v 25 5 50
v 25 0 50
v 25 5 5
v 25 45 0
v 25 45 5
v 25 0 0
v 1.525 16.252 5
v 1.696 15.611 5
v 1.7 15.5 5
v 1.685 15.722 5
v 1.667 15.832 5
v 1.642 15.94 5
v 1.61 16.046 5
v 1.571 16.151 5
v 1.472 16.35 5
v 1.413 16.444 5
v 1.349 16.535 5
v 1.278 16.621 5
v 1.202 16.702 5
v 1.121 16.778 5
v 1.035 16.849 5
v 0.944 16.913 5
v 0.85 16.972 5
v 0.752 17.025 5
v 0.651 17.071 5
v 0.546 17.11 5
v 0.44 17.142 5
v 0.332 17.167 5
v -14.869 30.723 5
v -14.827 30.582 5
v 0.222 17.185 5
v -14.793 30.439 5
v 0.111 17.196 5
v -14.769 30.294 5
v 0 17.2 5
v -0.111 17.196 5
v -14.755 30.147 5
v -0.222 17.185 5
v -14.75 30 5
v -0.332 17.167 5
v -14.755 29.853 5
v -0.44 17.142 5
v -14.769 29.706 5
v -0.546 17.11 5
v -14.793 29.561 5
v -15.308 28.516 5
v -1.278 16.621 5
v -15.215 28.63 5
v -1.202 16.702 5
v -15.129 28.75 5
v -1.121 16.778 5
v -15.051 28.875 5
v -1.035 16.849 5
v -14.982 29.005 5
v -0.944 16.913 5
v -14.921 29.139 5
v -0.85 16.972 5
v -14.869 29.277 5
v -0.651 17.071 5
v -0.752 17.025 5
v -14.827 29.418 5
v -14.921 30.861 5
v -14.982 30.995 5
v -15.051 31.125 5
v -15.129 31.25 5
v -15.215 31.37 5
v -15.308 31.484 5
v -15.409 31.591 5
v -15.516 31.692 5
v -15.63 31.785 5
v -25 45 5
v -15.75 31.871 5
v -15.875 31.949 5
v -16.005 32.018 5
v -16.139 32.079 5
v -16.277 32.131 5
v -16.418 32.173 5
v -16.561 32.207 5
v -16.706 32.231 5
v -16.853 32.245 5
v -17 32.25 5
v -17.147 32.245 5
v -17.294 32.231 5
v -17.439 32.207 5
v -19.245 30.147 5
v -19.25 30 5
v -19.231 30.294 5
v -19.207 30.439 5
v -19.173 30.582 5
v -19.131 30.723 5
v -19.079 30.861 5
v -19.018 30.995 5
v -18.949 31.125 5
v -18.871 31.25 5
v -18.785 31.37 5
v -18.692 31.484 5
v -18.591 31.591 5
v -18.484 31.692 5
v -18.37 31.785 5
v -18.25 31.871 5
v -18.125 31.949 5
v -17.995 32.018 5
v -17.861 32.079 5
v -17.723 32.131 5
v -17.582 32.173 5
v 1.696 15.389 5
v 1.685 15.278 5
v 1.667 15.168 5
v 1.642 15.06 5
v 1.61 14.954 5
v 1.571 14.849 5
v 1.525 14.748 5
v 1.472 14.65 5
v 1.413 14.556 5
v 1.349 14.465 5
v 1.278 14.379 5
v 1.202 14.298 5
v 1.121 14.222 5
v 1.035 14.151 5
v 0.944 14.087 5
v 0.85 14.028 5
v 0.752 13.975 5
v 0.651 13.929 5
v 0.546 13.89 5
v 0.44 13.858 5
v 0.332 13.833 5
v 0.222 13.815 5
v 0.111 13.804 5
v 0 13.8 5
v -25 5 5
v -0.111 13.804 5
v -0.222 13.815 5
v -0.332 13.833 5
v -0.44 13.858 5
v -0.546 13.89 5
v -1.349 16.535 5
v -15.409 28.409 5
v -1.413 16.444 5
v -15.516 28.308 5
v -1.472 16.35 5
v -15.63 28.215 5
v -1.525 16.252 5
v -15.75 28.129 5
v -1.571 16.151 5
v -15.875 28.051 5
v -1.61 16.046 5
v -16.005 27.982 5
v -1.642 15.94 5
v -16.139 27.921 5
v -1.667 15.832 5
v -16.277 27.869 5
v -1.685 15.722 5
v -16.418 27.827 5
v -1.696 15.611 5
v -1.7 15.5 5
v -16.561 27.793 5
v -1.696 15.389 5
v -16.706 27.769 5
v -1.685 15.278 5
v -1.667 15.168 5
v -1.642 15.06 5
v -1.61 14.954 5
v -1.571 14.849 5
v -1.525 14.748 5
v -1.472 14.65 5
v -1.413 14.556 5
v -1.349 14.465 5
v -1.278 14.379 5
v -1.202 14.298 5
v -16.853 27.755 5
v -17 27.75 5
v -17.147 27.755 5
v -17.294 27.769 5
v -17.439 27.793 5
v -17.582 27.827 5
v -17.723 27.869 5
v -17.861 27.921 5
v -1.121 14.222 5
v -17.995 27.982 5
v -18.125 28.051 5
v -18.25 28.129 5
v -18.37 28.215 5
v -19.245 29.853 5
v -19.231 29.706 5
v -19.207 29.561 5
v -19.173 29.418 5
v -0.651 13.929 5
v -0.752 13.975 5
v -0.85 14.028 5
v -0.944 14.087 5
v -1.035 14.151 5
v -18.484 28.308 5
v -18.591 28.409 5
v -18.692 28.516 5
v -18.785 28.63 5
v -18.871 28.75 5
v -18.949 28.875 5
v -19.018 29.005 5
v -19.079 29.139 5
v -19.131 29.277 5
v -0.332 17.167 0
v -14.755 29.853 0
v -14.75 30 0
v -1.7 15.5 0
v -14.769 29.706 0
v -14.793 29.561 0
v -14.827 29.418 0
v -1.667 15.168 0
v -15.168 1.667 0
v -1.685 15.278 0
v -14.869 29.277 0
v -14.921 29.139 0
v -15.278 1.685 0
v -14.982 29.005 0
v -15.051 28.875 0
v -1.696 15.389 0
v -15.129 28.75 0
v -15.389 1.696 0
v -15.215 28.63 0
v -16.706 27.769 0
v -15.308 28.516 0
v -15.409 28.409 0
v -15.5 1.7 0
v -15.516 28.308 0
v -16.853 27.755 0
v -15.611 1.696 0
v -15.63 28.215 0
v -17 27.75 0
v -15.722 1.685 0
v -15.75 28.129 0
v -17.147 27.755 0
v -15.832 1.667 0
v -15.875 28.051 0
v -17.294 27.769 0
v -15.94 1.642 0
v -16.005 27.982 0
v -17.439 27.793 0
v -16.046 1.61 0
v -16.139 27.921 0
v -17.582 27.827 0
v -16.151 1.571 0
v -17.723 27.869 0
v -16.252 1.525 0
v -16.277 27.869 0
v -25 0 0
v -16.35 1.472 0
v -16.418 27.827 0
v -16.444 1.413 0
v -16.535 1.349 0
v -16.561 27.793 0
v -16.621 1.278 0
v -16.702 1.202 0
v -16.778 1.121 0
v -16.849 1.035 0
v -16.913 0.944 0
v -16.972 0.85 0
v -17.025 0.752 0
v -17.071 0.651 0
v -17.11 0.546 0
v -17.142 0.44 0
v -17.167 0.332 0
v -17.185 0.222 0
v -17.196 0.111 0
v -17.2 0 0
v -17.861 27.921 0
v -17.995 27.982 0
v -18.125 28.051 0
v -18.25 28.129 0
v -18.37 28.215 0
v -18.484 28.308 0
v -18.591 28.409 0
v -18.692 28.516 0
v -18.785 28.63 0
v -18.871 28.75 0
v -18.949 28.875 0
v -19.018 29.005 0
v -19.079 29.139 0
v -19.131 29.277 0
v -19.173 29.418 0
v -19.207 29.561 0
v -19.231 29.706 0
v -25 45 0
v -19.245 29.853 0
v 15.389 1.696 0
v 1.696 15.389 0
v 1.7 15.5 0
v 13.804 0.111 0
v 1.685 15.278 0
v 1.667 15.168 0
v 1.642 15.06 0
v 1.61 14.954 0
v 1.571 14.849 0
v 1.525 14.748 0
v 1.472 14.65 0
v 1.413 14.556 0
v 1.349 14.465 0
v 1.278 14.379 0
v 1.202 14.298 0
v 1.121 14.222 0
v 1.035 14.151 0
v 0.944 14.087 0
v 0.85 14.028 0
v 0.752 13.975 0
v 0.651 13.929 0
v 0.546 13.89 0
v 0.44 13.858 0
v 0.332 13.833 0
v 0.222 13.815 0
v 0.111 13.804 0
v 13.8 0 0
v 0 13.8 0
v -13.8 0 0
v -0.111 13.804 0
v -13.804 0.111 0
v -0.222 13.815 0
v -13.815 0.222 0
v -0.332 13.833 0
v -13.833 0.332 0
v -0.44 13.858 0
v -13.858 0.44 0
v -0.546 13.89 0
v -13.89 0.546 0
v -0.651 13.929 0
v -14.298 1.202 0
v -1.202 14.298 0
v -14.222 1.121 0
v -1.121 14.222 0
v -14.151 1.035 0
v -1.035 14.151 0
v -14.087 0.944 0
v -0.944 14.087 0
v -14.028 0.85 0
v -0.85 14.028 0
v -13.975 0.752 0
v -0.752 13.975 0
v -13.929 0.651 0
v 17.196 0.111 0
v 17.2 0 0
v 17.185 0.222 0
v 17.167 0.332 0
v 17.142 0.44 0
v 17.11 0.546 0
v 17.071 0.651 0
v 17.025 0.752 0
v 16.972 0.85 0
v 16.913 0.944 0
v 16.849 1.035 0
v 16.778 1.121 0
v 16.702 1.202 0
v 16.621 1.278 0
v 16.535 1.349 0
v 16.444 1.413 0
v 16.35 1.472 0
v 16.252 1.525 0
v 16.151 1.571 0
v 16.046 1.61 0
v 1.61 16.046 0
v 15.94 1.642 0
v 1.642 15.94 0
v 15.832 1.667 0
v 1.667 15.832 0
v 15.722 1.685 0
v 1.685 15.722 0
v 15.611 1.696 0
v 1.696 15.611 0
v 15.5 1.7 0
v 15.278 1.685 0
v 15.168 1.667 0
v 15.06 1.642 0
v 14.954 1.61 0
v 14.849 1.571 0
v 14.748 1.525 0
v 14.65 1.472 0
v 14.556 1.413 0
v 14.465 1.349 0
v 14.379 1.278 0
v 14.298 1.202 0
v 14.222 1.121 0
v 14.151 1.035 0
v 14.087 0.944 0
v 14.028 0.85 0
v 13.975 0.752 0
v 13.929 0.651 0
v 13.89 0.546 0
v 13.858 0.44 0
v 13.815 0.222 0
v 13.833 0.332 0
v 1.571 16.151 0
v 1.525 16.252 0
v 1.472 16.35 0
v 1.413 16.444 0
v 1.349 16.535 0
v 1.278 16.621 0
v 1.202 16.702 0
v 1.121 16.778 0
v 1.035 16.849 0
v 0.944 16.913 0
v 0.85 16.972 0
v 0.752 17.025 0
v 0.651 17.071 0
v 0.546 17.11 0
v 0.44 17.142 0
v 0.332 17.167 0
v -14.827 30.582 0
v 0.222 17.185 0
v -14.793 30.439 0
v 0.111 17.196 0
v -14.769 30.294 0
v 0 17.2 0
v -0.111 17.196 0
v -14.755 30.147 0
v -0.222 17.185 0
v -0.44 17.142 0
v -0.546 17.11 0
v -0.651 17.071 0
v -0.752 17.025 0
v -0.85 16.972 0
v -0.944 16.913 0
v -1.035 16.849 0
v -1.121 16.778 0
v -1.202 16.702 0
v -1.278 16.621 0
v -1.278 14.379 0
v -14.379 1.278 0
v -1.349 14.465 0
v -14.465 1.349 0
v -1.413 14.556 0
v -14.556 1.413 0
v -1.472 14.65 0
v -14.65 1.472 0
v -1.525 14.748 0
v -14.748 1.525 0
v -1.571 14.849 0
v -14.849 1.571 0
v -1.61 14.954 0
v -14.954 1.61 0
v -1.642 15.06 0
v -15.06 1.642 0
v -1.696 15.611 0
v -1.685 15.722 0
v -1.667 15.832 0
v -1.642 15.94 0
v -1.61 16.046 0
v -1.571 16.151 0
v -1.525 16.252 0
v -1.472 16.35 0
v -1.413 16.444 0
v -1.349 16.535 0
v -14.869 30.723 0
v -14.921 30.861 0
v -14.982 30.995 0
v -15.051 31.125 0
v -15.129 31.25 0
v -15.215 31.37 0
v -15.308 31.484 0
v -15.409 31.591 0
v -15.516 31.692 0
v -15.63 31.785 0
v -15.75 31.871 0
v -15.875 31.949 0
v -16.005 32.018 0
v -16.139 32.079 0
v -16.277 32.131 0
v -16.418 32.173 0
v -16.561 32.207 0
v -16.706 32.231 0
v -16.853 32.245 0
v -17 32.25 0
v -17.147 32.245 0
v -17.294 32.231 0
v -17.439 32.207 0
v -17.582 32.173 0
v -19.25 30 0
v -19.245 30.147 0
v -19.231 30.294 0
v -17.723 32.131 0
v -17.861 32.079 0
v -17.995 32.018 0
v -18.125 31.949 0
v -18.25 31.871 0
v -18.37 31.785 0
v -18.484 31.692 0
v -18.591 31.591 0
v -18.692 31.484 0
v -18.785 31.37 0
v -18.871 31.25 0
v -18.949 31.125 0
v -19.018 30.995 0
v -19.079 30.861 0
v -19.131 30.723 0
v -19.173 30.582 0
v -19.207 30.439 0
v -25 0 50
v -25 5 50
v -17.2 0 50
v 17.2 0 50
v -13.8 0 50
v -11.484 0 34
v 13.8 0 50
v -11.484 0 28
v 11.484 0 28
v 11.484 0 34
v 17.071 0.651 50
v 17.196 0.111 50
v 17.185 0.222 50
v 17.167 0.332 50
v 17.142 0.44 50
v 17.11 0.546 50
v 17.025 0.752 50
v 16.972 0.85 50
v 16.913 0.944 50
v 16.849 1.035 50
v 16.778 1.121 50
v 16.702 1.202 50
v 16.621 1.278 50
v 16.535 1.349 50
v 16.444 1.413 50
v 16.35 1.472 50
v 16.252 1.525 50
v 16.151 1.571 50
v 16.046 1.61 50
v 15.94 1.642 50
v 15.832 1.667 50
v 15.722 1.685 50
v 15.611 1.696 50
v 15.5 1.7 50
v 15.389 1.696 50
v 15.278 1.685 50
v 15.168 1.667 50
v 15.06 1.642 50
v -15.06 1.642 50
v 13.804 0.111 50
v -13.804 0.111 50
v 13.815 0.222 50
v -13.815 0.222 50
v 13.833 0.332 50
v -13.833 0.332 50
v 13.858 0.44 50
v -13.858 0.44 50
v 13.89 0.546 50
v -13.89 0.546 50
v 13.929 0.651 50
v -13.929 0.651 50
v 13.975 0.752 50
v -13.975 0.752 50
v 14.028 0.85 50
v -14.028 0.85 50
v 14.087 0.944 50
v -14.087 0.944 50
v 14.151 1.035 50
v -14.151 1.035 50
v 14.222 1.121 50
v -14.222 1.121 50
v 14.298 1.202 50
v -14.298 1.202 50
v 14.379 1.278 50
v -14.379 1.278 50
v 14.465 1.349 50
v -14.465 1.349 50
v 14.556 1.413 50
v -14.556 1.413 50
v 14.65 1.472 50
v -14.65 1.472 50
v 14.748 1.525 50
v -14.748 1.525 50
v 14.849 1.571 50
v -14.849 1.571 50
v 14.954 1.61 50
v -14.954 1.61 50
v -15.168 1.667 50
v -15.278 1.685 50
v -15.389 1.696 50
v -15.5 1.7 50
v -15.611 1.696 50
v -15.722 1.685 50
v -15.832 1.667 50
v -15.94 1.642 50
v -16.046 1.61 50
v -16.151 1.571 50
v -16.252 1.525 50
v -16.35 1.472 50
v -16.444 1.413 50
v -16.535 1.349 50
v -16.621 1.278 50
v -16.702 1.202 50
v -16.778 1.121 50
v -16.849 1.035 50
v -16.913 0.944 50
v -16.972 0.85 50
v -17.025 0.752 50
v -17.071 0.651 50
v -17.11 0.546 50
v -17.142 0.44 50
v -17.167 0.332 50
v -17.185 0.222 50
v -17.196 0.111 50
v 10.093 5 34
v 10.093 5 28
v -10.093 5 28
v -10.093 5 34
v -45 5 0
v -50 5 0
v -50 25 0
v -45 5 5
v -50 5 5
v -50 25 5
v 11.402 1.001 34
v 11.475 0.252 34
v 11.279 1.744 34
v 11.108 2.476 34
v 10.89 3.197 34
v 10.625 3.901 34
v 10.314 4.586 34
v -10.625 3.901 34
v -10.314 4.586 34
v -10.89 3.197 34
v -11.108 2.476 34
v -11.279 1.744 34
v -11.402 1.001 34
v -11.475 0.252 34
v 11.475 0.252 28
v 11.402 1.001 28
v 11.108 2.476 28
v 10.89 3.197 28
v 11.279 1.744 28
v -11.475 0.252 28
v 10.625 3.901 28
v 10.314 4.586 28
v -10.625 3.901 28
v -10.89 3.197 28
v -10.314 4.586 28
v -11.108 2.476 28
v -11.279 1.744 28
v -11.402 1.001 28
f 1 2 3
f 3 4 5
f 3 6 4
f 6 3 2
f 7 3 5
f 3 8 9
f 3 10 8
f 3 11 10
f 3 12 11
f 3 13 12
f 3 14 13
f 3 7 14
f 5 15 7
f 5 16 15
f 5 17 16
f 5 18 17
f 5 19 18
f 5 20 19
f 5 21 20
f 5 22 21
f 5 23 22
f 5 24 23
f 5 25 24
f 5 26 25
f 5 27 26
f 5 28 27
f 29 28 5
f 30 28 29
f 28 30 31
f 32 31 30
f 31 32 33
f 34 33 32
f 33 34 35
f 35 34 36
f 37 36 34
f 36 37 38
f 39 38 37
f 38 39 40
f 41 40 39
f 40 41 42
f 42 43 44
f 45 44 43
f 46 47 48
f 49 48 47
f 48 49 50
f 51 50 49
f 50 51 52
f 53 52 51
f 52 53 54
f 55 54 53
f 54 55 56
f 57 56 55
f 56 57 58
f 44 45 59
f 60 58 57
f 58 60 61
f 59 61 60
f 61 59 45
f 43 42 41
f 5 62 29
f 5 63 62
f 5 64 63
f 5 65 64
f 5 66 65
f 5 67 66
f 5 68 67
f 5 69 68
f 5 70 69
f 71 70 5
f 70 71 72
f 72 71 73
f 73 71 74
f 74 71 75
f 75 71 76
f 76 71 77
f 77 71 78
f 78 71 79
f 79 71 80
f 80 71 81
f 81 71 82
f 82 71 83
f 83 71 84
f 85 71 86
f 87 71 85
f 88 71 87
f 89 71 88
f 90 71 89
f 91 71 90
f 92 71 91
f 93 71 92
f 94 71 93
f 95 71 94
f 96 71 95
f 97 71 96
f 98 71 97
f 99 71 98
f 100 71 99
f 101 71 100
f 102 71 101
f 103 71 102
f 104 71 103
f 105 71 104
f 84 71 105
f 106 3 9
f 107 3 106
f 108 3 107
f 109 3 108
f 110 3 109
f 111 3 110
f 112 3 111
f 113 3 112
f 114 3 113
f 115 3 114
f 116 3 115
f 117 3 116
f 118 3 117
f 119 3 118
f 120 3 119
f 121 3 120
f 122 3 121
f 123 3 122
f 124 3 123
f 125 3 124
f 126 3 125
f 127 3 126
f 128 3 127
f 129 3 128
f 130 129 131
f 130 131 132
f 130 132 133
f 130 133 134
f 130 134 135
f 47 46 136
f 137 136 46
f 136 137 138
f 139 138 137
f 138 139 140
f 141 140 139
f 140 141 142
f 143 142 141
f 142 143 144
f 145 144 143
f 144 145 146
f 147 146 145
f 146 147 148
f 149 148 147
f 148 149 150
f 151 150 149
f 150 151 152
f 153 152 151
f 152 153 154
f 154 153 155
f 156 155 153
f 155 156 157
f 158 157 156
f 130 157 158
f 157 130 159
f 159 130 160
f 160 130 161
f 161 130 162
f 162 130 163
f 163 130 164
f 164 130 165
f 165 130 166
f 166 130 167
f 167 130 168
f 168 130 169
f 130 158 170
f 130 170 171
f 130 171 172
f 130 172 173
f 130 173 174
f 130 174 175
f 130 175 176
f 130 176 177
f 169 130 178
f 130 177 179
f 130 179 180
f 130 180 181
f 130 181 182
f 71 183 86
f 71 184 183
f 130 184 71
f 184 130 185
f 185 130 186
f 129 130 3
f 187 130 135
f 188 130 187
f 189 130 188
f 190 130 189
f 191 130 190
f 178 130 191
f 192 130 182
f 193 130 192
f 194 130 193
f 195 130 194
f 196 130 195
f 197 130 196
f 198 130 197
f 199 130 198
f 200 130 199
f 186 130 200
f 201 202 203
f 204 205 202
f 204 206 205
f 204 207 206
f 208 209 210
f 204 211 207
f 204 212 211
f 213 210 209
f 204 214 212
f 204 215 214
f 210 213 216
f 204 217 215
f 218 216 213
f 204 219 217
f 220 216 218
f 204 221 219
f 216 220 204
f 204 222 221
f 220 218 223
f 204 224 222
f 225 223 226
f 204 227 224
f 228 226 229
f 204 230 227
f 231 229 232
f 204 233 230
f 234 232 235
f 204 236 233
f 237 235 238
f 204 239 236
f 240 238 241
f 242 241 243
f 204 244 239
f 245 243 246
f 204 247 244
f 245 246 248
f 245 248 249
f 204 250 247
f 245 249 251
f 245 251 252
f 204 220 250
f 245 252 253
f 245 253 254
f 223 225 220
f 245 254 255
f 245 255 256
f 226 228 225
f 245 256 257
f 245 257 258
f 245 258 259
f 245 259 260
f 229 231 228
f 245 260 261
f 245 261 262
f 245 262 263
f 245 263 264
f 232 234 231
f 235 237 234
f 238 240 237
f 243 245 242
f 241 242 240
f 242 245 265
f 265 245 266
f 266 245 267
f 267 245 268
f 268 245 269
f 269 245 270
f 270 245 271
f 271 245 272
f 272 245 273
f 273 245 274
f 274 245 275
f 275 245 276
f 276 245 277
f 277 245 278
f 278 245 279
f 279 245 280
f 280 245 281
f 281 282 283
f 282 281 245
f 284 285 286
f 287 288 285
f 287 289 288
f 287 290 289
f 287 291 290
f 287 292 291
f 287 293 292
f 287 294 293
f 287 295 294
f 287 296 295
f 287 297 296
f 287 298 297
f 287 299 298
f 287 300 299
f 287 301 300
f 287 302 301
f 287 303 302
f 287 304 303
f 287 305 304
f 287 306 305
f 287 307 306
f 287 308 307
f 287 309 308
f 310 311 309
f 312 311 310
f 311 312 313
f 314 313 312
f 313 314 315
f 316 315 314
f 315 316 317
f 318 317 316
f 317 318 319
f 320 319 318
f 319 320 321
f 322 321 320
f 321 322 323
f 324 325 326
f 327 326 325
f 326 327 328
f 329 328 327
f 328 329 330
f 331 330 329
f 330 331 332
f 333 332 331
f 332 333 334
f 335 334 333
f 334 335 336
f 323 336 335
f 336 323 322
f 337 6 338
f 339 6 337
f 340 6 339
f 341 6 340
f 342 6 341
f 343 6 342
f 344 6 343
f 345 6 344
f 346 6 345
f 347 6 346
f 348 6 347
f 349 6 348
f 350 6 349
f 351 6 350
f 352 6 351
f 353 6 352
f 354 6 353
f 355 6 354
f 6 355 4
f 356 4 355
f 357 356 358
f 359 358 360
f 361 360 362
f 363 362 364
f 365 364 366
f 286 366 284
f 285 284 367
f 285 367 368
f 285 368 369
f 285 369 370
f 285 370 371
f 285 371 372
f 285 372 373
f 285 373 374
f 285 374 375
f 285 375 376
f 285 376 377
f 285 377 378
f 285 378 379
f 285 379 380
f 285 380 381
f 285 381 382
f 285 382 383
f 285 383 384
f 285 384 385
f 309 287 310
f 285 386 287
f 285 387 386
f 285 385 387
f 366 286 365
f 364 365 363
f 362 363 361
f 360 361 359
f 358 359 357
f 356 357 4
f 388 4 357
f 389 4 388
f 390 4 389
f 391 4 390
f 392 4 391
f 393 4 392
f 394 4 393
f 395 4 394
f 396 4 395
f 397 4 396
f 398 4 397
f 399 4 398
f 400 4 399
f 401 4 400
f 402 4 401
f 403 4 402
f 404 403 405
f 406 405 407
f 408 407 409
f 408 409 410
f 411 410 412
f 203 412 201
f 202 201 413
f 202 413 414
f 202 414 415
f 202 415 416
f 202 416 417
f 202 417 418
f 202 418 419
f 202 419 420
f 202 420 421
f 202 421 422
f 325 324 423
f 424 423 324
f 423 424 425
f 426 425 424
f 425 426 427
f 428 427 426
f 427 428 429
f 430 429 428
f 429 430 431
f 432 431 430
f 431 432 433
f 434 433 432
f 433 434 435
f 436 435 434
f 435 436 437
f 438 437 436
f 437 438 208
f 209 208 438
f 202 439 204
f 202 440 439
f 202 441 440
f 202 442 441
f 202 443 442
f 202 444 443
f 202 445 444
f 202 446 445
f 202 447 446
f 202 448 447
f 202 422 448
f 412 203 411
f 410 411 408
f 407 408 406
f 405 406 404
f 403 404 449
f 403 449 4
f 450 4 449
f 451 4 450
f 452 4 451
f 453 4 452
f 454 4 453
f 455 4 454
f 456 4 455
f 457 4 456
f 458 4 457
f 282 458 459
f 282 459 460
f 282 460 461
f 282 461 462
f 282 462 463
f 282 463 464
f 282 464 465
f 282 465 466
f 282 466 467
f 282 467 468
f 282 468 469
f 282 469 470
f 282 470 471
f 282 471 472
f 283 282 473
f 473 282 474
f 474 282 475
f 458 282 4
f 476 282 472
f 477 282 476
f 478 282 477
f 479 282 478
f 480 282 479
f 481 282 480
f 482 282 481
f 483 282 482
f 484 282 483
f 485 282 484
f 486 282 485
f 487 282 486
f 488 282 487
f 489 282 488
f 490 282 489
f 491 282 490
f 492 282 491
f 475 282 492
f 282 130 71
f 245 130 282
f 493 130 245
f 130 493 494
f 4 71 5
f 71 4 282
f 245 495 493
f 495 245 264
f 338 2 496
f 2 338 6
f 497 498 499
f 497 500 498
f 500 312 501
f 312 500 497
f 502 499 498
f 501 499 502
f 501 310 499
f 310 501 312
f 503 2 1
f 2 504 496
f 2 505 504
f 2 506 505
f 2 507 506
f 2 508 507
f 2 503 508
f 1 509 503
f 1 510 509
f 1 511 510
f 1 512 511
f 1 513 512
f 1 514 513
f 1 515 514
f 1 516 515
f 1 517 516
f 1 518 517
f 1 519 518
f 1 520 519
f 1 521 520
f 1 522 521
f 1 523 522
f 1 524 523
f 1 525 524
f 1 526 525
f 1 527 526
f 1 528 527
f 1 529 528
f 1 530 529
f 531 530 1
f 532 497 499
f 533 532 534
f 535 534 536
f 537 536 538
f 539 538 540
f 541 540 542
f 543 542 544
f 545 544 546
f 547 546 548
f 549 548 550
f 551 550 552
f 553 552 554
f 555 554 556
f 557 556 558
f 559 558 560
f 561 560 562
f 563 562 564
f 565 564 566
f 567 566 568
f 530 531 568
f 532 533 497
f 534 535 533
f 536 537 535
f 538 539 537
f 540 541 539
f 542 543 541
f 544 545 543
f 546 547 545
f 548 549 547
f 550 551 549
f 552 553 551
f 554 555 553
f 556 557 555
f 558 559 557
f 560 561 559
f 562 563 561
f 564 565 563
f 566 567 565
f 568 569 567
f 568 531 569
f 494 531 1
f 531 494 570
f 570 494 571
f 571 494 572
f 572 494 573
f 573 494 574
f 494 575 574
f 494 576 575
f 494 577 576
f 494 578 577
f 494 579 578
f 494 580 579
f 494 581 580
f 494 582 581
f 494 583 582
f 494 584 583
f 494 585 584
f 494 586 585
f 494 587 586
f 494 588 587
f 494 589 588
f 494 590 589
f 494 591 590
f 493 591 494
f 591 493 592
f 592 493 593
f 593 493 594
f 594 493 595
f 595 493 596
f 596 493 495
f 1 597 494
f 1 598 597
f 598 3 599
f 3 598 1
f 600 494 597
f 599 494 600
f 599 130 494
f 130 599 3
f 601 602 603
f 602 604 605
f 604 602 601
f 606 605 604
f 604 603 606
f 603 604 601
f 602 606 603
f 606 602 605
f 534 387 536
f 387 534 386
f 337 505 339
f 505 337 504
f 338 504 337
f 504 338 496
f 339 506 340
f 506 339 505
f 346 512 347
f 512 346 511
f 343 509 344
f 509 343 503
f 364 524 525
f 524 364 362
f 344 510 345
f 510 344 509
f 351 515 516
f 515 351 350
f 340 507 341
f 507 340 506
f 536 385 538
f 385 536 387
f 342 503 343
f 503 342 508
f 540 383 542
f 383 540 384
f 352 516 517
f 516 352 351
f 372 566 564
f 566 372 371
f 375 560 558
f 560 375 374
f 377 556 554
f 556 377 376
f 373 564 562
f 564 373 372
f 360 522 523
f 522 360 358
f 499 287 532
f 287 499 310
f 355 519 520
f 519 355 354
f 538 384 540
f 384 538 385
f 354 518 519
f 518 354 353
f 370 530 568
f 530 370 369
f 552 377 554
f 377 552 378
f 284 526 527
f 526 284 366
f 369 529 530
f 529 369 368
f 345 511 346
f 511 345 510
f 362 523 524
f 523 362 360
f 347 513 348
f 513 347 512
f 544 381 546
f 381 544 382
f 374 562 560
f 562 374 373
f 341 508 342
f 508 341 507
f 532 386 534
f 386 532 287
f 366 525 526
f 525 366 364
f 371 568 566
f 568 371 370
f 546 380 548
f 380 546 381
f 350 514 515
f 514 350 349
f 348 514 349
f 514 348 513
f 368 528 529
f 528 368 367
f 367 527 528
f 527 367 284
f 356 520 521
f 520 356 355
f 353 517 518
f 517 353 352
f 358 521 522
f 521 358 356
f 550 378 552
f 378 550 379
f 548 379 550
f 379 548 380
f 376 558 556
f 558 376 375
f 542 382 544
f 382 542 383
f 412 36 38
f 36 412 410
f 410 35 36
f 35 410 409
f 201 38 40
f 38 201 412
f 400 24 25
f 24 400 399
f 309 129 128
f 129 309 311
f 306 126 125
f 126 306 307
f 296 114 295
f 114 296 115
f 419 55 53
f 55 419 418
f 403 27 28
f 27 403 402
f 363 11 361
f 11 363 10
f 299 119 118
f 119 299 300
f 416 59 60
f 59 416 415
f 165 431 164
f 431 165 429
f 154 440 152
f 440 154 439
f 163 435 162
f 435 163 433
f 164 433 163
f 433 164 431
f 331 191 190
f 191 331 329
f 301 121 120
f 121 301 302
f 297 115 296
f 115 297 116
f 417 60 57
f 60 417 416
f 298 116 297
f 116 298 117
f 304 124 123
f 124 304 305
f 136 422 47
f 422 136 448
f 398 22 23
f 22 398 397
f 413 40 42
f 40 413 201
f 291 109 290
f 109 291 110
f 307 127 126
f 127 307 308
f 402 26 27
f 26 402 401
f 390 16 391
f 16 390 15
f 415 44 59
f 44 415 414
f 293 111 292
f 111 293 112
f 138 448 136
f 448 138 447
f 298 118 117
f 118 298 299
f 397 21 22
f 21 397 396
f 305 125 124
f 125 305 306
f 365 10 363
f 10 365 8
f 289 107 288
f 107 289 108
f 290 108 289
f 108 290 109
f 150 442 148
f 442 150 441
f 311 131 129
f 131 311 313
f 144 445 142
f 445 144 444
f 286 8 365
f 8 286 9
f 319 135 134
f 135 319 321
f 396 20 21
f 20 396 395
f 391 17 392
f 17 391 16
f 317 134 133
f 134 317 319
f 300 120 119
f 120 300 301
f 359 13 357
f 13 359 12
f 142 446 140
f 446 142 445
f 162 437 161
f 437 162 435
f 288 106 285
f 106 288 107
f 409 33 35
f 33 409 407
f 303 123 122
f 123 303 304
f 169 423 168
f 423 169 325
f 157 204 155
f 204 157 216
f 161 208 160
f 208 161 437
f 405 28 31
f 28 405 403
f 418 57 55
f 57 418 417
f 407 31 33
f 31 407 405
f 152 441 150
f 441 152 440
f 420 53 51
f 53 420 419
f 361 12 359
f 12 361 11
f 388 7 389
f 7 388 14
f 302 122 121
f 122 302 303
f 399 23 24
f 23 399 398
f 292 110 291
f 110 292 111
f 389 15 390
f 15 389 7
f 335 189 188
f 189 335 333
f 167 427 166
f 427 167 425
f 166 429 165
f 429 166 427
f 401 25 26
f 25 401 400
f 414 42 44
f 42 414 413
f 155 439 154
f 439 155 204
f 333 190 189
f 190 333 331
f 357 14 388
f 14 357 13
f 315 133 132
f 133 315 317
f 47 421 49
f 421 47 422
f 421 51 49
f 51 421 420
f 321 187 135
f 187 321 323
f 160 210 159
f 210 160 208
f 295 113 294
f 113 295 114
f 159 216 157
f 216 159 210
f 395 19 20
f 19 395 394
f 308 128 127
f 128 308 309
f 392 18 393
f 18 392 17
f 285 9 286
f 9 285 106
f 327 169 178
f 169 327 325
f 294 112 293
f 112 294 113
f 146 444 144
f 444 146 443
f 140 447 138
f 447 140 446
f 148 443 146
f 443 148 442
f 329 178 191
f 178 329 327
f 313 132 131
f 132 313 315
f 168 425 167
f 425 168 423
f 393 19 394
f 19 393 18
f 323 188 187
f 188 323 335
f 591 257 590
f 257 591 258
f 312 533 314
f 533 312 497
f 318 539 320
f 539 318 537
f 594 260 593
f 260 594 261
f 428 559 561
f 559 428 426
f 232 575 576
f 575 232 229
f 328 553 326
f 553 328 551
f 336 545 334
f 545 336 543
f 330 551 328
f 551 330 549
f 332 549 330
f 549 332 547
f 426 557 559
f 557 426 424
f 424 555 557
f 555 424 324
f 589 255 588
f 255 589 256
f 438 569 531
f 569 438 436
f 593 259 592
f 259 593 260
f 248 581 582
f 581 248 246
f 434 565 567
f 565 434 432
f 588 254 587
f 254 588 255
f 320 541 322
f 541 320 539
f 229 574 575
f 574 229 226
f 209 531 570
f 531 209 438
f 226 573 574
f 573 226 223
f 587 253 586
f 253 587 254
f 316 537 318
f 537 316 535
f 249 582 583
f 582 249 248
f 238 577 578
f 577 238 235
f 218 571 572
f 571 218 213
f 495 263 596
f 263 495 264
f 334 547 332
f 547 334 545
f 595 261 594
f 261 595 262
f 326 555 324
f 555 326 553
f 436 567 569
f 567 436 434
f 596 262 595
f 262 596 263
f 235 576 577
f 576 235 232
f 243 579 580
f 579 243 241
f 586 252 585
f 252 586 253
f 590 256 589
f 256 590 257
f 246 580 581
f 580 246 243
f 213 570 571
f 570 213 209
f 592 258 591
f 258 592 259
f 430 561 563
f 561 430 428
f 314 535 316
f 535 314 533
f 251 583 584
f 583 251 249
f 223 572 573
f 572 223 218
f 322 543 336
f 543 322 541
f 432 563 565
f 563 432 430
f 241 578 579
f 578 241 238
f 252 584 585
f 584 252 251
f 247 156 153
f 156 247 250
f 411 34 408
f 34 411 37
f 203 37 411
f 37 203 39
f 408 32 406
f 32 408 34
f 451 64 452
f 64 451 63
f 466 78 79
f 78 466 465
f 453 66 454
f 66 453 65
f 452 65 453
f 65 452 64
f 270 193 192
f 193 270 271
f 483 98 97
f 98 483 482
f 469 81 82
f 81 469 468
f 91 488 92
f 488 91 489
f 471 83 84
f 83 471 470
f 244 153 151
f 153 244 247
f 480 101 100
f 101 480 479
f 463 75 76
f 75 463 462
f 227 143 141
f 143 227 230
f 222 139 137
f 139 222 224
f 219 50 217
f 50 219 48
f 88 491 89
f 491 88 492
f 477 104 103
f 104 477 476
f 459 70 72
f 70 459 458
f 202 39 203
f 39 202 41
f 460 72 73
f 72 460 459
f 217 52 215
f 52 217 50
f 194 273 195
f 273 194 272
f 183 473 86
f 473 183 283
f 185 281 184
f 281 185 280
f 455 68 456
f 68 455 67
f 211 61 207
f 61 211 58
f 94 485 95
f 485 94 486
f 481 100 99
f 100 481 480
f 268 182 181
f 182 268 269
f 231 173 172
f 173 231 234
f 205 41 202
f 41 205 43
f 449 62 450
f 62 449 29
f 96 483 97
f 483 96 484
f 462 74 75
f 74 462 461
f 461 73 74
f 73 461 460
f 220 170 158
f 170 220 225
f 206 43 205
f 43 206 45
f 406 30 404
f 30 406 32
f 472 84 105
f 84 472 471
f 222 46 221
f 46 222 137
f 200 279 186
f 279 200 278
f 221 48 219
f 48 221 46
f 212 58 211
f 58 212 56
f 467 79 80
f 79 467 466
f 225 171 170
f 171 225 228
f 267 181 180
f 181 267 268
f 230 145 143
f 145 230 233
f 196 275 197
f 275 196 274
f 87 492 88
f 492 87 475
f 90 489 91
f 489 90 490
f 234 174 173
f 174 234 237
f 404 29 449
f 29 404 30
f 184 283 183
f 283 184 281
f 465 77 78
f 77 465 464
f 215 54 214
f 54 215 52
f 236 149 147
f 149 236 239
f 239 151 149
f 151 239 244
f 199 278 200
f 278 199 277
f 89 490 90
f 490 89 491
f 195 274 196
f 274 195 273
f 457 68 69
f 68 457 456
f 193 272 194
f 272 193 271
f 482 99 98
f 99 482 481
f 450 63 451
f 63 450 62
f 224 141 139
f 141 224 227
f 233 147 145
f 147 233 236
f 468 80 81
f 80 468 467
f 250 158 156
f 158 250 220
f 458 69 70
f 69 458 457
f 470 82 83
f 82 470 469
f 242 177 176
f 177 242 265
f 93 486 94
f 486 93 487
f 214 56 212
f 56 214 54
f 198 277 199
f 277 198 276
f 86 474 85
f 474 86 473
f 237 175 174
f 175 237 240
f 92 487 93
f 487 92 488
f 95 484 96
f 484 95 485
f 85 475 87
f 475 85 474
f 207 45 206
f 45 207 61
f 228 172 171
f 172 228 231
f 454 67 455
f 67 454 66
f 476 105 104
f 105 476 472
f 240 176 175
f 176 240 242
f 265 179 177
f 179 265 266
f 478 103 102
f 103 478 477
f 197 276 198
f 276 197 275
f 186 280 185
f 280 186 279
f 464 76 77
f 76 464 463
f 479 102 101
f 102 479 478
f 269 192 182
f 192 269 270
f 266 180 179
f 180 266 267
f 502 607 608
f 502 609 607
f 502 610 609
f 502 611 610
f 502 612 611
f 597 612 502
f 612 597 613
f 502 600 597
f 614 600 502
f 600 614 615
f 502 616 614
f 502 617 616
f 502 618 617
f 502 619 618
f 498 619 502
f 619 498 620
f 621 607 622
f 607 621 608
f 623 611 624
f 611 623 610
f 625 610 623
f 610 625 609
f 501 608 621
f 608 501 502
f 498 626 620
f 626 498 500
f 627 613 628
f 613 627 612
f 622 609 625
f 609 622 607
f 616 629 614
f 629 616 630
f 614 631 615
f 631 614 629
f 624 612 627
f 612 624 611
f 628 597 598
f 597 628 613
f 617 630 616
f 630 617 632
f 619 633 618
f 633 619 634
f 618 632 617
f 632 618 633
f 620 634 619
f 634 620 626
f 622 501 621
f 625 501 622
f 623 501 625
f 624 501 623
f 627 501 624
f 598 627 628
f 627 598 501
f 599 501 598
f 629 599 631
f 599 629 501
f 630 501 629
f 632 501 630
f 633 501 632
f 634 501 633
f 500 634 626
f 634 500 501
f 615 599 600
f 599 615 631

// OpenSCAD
// L-shaped mounting bracket for NEMA 17 stepper motor
// Print orientation: base plate on bed (z = 0), motor plate builds upward (+Z)

// ---------------- Parameters ----------------
base_x0      = -25;    // base plate: x start
base_x1      = 25;     // base plate: x end
base_y0      = 0;      // base plate: y start
base_y1      = 45;     // base plate: y end
base_z0      = 0;      // base plate: z start
base_z1      = 5;      // base plate: z end

hole_x       = -17;    // M4 through-hole x position
hole_y       = 30;     // M4 through-hole y position
hole_d       = 4.5;    // M4 hole diameter

motor_x0     = -25;    // motor plate: x start
motor_x1     = 25;     // motor plate: x end
motor_y0     = 0;      // motor plate: y start
motor_y1     = 5;      // motor plate: y end
motor_z0     = 0;      // motor plate: z start
motor_z1     = 50;     // motor plate: z end

boss_d       = 23;     // motor centring boss hole diameter
boss_x       = 0;      // boss hole centre x
boss_z       = 28;     // boss hole centre z

screw_d      = 3.4;    // M3 screw hole diameter
screw_p      = 31;     // square pattern side length

gusset_t     = 5;      // gusset thickness (X)
gusset_leg   = 20;     // right triangle leg length (Y and Z)
gusset_x0    = -25;    // gusset left edge x
gusset_x1    = -20;    // gusset right-angle corner x

eps          = 0.5;    // cutter overshoot past faces

$fn = 96;

// ---------------- Model ----------------
difference() {
    union() {
        // Base plate
        translate([base_x0, base_y0, base_z0])
            cube([base_x1 - base_x0, base_y1 - base_y0, base_z1 - base_z0]);

        // Vertical motor plate
        translate([motor_x0, motor_y0, motor_z0])
            cube([motor_x1 - motor_x0, motor_y1 - motor_y0, motor_z1 - motor_z0]);

        // Left gusset (x = -25 to -20)
        translate([gusset_x0, 0, 0])
            linear_extrude(height = gusset_t)
                polygon(points = [
                    [-25, 5],
                    [-25, 25],
                    [-20, 5]
                ]);

        // Right gusset (x = 20 to 25)
        translate([gusset_x1, 0, 0])
            linear_extrude(height = gusset_t)
                polygon(points = [
                    [20, 5],
                    [20, 25],
                    [25, 5]
                ]);
    }

    // M4 through-holes in base plate
    translate([hole_x, hole_y, -eps])
        cylinder(d = hole_d, h = base_z1 - base_z0 + 2 * eps);

    // Boss hole for motor centring (along Y)
    translate([boss_x, motor_y0 - eps, boss_z])
        cylinder(d = boss_d, h = motor_y1 - motor_y0 + 2 * eps);

    // M3 screw holes on 31 mm square pattern, centred on boss hole
    for (a = [0, 90, 180, 270])
        rotate([0, 0, a])
            translate([screw_p / 2, 0, -eps])
                cylinder(d = screw_d, h = motor_z1 - motor_z0 + 2 * eps);
}
